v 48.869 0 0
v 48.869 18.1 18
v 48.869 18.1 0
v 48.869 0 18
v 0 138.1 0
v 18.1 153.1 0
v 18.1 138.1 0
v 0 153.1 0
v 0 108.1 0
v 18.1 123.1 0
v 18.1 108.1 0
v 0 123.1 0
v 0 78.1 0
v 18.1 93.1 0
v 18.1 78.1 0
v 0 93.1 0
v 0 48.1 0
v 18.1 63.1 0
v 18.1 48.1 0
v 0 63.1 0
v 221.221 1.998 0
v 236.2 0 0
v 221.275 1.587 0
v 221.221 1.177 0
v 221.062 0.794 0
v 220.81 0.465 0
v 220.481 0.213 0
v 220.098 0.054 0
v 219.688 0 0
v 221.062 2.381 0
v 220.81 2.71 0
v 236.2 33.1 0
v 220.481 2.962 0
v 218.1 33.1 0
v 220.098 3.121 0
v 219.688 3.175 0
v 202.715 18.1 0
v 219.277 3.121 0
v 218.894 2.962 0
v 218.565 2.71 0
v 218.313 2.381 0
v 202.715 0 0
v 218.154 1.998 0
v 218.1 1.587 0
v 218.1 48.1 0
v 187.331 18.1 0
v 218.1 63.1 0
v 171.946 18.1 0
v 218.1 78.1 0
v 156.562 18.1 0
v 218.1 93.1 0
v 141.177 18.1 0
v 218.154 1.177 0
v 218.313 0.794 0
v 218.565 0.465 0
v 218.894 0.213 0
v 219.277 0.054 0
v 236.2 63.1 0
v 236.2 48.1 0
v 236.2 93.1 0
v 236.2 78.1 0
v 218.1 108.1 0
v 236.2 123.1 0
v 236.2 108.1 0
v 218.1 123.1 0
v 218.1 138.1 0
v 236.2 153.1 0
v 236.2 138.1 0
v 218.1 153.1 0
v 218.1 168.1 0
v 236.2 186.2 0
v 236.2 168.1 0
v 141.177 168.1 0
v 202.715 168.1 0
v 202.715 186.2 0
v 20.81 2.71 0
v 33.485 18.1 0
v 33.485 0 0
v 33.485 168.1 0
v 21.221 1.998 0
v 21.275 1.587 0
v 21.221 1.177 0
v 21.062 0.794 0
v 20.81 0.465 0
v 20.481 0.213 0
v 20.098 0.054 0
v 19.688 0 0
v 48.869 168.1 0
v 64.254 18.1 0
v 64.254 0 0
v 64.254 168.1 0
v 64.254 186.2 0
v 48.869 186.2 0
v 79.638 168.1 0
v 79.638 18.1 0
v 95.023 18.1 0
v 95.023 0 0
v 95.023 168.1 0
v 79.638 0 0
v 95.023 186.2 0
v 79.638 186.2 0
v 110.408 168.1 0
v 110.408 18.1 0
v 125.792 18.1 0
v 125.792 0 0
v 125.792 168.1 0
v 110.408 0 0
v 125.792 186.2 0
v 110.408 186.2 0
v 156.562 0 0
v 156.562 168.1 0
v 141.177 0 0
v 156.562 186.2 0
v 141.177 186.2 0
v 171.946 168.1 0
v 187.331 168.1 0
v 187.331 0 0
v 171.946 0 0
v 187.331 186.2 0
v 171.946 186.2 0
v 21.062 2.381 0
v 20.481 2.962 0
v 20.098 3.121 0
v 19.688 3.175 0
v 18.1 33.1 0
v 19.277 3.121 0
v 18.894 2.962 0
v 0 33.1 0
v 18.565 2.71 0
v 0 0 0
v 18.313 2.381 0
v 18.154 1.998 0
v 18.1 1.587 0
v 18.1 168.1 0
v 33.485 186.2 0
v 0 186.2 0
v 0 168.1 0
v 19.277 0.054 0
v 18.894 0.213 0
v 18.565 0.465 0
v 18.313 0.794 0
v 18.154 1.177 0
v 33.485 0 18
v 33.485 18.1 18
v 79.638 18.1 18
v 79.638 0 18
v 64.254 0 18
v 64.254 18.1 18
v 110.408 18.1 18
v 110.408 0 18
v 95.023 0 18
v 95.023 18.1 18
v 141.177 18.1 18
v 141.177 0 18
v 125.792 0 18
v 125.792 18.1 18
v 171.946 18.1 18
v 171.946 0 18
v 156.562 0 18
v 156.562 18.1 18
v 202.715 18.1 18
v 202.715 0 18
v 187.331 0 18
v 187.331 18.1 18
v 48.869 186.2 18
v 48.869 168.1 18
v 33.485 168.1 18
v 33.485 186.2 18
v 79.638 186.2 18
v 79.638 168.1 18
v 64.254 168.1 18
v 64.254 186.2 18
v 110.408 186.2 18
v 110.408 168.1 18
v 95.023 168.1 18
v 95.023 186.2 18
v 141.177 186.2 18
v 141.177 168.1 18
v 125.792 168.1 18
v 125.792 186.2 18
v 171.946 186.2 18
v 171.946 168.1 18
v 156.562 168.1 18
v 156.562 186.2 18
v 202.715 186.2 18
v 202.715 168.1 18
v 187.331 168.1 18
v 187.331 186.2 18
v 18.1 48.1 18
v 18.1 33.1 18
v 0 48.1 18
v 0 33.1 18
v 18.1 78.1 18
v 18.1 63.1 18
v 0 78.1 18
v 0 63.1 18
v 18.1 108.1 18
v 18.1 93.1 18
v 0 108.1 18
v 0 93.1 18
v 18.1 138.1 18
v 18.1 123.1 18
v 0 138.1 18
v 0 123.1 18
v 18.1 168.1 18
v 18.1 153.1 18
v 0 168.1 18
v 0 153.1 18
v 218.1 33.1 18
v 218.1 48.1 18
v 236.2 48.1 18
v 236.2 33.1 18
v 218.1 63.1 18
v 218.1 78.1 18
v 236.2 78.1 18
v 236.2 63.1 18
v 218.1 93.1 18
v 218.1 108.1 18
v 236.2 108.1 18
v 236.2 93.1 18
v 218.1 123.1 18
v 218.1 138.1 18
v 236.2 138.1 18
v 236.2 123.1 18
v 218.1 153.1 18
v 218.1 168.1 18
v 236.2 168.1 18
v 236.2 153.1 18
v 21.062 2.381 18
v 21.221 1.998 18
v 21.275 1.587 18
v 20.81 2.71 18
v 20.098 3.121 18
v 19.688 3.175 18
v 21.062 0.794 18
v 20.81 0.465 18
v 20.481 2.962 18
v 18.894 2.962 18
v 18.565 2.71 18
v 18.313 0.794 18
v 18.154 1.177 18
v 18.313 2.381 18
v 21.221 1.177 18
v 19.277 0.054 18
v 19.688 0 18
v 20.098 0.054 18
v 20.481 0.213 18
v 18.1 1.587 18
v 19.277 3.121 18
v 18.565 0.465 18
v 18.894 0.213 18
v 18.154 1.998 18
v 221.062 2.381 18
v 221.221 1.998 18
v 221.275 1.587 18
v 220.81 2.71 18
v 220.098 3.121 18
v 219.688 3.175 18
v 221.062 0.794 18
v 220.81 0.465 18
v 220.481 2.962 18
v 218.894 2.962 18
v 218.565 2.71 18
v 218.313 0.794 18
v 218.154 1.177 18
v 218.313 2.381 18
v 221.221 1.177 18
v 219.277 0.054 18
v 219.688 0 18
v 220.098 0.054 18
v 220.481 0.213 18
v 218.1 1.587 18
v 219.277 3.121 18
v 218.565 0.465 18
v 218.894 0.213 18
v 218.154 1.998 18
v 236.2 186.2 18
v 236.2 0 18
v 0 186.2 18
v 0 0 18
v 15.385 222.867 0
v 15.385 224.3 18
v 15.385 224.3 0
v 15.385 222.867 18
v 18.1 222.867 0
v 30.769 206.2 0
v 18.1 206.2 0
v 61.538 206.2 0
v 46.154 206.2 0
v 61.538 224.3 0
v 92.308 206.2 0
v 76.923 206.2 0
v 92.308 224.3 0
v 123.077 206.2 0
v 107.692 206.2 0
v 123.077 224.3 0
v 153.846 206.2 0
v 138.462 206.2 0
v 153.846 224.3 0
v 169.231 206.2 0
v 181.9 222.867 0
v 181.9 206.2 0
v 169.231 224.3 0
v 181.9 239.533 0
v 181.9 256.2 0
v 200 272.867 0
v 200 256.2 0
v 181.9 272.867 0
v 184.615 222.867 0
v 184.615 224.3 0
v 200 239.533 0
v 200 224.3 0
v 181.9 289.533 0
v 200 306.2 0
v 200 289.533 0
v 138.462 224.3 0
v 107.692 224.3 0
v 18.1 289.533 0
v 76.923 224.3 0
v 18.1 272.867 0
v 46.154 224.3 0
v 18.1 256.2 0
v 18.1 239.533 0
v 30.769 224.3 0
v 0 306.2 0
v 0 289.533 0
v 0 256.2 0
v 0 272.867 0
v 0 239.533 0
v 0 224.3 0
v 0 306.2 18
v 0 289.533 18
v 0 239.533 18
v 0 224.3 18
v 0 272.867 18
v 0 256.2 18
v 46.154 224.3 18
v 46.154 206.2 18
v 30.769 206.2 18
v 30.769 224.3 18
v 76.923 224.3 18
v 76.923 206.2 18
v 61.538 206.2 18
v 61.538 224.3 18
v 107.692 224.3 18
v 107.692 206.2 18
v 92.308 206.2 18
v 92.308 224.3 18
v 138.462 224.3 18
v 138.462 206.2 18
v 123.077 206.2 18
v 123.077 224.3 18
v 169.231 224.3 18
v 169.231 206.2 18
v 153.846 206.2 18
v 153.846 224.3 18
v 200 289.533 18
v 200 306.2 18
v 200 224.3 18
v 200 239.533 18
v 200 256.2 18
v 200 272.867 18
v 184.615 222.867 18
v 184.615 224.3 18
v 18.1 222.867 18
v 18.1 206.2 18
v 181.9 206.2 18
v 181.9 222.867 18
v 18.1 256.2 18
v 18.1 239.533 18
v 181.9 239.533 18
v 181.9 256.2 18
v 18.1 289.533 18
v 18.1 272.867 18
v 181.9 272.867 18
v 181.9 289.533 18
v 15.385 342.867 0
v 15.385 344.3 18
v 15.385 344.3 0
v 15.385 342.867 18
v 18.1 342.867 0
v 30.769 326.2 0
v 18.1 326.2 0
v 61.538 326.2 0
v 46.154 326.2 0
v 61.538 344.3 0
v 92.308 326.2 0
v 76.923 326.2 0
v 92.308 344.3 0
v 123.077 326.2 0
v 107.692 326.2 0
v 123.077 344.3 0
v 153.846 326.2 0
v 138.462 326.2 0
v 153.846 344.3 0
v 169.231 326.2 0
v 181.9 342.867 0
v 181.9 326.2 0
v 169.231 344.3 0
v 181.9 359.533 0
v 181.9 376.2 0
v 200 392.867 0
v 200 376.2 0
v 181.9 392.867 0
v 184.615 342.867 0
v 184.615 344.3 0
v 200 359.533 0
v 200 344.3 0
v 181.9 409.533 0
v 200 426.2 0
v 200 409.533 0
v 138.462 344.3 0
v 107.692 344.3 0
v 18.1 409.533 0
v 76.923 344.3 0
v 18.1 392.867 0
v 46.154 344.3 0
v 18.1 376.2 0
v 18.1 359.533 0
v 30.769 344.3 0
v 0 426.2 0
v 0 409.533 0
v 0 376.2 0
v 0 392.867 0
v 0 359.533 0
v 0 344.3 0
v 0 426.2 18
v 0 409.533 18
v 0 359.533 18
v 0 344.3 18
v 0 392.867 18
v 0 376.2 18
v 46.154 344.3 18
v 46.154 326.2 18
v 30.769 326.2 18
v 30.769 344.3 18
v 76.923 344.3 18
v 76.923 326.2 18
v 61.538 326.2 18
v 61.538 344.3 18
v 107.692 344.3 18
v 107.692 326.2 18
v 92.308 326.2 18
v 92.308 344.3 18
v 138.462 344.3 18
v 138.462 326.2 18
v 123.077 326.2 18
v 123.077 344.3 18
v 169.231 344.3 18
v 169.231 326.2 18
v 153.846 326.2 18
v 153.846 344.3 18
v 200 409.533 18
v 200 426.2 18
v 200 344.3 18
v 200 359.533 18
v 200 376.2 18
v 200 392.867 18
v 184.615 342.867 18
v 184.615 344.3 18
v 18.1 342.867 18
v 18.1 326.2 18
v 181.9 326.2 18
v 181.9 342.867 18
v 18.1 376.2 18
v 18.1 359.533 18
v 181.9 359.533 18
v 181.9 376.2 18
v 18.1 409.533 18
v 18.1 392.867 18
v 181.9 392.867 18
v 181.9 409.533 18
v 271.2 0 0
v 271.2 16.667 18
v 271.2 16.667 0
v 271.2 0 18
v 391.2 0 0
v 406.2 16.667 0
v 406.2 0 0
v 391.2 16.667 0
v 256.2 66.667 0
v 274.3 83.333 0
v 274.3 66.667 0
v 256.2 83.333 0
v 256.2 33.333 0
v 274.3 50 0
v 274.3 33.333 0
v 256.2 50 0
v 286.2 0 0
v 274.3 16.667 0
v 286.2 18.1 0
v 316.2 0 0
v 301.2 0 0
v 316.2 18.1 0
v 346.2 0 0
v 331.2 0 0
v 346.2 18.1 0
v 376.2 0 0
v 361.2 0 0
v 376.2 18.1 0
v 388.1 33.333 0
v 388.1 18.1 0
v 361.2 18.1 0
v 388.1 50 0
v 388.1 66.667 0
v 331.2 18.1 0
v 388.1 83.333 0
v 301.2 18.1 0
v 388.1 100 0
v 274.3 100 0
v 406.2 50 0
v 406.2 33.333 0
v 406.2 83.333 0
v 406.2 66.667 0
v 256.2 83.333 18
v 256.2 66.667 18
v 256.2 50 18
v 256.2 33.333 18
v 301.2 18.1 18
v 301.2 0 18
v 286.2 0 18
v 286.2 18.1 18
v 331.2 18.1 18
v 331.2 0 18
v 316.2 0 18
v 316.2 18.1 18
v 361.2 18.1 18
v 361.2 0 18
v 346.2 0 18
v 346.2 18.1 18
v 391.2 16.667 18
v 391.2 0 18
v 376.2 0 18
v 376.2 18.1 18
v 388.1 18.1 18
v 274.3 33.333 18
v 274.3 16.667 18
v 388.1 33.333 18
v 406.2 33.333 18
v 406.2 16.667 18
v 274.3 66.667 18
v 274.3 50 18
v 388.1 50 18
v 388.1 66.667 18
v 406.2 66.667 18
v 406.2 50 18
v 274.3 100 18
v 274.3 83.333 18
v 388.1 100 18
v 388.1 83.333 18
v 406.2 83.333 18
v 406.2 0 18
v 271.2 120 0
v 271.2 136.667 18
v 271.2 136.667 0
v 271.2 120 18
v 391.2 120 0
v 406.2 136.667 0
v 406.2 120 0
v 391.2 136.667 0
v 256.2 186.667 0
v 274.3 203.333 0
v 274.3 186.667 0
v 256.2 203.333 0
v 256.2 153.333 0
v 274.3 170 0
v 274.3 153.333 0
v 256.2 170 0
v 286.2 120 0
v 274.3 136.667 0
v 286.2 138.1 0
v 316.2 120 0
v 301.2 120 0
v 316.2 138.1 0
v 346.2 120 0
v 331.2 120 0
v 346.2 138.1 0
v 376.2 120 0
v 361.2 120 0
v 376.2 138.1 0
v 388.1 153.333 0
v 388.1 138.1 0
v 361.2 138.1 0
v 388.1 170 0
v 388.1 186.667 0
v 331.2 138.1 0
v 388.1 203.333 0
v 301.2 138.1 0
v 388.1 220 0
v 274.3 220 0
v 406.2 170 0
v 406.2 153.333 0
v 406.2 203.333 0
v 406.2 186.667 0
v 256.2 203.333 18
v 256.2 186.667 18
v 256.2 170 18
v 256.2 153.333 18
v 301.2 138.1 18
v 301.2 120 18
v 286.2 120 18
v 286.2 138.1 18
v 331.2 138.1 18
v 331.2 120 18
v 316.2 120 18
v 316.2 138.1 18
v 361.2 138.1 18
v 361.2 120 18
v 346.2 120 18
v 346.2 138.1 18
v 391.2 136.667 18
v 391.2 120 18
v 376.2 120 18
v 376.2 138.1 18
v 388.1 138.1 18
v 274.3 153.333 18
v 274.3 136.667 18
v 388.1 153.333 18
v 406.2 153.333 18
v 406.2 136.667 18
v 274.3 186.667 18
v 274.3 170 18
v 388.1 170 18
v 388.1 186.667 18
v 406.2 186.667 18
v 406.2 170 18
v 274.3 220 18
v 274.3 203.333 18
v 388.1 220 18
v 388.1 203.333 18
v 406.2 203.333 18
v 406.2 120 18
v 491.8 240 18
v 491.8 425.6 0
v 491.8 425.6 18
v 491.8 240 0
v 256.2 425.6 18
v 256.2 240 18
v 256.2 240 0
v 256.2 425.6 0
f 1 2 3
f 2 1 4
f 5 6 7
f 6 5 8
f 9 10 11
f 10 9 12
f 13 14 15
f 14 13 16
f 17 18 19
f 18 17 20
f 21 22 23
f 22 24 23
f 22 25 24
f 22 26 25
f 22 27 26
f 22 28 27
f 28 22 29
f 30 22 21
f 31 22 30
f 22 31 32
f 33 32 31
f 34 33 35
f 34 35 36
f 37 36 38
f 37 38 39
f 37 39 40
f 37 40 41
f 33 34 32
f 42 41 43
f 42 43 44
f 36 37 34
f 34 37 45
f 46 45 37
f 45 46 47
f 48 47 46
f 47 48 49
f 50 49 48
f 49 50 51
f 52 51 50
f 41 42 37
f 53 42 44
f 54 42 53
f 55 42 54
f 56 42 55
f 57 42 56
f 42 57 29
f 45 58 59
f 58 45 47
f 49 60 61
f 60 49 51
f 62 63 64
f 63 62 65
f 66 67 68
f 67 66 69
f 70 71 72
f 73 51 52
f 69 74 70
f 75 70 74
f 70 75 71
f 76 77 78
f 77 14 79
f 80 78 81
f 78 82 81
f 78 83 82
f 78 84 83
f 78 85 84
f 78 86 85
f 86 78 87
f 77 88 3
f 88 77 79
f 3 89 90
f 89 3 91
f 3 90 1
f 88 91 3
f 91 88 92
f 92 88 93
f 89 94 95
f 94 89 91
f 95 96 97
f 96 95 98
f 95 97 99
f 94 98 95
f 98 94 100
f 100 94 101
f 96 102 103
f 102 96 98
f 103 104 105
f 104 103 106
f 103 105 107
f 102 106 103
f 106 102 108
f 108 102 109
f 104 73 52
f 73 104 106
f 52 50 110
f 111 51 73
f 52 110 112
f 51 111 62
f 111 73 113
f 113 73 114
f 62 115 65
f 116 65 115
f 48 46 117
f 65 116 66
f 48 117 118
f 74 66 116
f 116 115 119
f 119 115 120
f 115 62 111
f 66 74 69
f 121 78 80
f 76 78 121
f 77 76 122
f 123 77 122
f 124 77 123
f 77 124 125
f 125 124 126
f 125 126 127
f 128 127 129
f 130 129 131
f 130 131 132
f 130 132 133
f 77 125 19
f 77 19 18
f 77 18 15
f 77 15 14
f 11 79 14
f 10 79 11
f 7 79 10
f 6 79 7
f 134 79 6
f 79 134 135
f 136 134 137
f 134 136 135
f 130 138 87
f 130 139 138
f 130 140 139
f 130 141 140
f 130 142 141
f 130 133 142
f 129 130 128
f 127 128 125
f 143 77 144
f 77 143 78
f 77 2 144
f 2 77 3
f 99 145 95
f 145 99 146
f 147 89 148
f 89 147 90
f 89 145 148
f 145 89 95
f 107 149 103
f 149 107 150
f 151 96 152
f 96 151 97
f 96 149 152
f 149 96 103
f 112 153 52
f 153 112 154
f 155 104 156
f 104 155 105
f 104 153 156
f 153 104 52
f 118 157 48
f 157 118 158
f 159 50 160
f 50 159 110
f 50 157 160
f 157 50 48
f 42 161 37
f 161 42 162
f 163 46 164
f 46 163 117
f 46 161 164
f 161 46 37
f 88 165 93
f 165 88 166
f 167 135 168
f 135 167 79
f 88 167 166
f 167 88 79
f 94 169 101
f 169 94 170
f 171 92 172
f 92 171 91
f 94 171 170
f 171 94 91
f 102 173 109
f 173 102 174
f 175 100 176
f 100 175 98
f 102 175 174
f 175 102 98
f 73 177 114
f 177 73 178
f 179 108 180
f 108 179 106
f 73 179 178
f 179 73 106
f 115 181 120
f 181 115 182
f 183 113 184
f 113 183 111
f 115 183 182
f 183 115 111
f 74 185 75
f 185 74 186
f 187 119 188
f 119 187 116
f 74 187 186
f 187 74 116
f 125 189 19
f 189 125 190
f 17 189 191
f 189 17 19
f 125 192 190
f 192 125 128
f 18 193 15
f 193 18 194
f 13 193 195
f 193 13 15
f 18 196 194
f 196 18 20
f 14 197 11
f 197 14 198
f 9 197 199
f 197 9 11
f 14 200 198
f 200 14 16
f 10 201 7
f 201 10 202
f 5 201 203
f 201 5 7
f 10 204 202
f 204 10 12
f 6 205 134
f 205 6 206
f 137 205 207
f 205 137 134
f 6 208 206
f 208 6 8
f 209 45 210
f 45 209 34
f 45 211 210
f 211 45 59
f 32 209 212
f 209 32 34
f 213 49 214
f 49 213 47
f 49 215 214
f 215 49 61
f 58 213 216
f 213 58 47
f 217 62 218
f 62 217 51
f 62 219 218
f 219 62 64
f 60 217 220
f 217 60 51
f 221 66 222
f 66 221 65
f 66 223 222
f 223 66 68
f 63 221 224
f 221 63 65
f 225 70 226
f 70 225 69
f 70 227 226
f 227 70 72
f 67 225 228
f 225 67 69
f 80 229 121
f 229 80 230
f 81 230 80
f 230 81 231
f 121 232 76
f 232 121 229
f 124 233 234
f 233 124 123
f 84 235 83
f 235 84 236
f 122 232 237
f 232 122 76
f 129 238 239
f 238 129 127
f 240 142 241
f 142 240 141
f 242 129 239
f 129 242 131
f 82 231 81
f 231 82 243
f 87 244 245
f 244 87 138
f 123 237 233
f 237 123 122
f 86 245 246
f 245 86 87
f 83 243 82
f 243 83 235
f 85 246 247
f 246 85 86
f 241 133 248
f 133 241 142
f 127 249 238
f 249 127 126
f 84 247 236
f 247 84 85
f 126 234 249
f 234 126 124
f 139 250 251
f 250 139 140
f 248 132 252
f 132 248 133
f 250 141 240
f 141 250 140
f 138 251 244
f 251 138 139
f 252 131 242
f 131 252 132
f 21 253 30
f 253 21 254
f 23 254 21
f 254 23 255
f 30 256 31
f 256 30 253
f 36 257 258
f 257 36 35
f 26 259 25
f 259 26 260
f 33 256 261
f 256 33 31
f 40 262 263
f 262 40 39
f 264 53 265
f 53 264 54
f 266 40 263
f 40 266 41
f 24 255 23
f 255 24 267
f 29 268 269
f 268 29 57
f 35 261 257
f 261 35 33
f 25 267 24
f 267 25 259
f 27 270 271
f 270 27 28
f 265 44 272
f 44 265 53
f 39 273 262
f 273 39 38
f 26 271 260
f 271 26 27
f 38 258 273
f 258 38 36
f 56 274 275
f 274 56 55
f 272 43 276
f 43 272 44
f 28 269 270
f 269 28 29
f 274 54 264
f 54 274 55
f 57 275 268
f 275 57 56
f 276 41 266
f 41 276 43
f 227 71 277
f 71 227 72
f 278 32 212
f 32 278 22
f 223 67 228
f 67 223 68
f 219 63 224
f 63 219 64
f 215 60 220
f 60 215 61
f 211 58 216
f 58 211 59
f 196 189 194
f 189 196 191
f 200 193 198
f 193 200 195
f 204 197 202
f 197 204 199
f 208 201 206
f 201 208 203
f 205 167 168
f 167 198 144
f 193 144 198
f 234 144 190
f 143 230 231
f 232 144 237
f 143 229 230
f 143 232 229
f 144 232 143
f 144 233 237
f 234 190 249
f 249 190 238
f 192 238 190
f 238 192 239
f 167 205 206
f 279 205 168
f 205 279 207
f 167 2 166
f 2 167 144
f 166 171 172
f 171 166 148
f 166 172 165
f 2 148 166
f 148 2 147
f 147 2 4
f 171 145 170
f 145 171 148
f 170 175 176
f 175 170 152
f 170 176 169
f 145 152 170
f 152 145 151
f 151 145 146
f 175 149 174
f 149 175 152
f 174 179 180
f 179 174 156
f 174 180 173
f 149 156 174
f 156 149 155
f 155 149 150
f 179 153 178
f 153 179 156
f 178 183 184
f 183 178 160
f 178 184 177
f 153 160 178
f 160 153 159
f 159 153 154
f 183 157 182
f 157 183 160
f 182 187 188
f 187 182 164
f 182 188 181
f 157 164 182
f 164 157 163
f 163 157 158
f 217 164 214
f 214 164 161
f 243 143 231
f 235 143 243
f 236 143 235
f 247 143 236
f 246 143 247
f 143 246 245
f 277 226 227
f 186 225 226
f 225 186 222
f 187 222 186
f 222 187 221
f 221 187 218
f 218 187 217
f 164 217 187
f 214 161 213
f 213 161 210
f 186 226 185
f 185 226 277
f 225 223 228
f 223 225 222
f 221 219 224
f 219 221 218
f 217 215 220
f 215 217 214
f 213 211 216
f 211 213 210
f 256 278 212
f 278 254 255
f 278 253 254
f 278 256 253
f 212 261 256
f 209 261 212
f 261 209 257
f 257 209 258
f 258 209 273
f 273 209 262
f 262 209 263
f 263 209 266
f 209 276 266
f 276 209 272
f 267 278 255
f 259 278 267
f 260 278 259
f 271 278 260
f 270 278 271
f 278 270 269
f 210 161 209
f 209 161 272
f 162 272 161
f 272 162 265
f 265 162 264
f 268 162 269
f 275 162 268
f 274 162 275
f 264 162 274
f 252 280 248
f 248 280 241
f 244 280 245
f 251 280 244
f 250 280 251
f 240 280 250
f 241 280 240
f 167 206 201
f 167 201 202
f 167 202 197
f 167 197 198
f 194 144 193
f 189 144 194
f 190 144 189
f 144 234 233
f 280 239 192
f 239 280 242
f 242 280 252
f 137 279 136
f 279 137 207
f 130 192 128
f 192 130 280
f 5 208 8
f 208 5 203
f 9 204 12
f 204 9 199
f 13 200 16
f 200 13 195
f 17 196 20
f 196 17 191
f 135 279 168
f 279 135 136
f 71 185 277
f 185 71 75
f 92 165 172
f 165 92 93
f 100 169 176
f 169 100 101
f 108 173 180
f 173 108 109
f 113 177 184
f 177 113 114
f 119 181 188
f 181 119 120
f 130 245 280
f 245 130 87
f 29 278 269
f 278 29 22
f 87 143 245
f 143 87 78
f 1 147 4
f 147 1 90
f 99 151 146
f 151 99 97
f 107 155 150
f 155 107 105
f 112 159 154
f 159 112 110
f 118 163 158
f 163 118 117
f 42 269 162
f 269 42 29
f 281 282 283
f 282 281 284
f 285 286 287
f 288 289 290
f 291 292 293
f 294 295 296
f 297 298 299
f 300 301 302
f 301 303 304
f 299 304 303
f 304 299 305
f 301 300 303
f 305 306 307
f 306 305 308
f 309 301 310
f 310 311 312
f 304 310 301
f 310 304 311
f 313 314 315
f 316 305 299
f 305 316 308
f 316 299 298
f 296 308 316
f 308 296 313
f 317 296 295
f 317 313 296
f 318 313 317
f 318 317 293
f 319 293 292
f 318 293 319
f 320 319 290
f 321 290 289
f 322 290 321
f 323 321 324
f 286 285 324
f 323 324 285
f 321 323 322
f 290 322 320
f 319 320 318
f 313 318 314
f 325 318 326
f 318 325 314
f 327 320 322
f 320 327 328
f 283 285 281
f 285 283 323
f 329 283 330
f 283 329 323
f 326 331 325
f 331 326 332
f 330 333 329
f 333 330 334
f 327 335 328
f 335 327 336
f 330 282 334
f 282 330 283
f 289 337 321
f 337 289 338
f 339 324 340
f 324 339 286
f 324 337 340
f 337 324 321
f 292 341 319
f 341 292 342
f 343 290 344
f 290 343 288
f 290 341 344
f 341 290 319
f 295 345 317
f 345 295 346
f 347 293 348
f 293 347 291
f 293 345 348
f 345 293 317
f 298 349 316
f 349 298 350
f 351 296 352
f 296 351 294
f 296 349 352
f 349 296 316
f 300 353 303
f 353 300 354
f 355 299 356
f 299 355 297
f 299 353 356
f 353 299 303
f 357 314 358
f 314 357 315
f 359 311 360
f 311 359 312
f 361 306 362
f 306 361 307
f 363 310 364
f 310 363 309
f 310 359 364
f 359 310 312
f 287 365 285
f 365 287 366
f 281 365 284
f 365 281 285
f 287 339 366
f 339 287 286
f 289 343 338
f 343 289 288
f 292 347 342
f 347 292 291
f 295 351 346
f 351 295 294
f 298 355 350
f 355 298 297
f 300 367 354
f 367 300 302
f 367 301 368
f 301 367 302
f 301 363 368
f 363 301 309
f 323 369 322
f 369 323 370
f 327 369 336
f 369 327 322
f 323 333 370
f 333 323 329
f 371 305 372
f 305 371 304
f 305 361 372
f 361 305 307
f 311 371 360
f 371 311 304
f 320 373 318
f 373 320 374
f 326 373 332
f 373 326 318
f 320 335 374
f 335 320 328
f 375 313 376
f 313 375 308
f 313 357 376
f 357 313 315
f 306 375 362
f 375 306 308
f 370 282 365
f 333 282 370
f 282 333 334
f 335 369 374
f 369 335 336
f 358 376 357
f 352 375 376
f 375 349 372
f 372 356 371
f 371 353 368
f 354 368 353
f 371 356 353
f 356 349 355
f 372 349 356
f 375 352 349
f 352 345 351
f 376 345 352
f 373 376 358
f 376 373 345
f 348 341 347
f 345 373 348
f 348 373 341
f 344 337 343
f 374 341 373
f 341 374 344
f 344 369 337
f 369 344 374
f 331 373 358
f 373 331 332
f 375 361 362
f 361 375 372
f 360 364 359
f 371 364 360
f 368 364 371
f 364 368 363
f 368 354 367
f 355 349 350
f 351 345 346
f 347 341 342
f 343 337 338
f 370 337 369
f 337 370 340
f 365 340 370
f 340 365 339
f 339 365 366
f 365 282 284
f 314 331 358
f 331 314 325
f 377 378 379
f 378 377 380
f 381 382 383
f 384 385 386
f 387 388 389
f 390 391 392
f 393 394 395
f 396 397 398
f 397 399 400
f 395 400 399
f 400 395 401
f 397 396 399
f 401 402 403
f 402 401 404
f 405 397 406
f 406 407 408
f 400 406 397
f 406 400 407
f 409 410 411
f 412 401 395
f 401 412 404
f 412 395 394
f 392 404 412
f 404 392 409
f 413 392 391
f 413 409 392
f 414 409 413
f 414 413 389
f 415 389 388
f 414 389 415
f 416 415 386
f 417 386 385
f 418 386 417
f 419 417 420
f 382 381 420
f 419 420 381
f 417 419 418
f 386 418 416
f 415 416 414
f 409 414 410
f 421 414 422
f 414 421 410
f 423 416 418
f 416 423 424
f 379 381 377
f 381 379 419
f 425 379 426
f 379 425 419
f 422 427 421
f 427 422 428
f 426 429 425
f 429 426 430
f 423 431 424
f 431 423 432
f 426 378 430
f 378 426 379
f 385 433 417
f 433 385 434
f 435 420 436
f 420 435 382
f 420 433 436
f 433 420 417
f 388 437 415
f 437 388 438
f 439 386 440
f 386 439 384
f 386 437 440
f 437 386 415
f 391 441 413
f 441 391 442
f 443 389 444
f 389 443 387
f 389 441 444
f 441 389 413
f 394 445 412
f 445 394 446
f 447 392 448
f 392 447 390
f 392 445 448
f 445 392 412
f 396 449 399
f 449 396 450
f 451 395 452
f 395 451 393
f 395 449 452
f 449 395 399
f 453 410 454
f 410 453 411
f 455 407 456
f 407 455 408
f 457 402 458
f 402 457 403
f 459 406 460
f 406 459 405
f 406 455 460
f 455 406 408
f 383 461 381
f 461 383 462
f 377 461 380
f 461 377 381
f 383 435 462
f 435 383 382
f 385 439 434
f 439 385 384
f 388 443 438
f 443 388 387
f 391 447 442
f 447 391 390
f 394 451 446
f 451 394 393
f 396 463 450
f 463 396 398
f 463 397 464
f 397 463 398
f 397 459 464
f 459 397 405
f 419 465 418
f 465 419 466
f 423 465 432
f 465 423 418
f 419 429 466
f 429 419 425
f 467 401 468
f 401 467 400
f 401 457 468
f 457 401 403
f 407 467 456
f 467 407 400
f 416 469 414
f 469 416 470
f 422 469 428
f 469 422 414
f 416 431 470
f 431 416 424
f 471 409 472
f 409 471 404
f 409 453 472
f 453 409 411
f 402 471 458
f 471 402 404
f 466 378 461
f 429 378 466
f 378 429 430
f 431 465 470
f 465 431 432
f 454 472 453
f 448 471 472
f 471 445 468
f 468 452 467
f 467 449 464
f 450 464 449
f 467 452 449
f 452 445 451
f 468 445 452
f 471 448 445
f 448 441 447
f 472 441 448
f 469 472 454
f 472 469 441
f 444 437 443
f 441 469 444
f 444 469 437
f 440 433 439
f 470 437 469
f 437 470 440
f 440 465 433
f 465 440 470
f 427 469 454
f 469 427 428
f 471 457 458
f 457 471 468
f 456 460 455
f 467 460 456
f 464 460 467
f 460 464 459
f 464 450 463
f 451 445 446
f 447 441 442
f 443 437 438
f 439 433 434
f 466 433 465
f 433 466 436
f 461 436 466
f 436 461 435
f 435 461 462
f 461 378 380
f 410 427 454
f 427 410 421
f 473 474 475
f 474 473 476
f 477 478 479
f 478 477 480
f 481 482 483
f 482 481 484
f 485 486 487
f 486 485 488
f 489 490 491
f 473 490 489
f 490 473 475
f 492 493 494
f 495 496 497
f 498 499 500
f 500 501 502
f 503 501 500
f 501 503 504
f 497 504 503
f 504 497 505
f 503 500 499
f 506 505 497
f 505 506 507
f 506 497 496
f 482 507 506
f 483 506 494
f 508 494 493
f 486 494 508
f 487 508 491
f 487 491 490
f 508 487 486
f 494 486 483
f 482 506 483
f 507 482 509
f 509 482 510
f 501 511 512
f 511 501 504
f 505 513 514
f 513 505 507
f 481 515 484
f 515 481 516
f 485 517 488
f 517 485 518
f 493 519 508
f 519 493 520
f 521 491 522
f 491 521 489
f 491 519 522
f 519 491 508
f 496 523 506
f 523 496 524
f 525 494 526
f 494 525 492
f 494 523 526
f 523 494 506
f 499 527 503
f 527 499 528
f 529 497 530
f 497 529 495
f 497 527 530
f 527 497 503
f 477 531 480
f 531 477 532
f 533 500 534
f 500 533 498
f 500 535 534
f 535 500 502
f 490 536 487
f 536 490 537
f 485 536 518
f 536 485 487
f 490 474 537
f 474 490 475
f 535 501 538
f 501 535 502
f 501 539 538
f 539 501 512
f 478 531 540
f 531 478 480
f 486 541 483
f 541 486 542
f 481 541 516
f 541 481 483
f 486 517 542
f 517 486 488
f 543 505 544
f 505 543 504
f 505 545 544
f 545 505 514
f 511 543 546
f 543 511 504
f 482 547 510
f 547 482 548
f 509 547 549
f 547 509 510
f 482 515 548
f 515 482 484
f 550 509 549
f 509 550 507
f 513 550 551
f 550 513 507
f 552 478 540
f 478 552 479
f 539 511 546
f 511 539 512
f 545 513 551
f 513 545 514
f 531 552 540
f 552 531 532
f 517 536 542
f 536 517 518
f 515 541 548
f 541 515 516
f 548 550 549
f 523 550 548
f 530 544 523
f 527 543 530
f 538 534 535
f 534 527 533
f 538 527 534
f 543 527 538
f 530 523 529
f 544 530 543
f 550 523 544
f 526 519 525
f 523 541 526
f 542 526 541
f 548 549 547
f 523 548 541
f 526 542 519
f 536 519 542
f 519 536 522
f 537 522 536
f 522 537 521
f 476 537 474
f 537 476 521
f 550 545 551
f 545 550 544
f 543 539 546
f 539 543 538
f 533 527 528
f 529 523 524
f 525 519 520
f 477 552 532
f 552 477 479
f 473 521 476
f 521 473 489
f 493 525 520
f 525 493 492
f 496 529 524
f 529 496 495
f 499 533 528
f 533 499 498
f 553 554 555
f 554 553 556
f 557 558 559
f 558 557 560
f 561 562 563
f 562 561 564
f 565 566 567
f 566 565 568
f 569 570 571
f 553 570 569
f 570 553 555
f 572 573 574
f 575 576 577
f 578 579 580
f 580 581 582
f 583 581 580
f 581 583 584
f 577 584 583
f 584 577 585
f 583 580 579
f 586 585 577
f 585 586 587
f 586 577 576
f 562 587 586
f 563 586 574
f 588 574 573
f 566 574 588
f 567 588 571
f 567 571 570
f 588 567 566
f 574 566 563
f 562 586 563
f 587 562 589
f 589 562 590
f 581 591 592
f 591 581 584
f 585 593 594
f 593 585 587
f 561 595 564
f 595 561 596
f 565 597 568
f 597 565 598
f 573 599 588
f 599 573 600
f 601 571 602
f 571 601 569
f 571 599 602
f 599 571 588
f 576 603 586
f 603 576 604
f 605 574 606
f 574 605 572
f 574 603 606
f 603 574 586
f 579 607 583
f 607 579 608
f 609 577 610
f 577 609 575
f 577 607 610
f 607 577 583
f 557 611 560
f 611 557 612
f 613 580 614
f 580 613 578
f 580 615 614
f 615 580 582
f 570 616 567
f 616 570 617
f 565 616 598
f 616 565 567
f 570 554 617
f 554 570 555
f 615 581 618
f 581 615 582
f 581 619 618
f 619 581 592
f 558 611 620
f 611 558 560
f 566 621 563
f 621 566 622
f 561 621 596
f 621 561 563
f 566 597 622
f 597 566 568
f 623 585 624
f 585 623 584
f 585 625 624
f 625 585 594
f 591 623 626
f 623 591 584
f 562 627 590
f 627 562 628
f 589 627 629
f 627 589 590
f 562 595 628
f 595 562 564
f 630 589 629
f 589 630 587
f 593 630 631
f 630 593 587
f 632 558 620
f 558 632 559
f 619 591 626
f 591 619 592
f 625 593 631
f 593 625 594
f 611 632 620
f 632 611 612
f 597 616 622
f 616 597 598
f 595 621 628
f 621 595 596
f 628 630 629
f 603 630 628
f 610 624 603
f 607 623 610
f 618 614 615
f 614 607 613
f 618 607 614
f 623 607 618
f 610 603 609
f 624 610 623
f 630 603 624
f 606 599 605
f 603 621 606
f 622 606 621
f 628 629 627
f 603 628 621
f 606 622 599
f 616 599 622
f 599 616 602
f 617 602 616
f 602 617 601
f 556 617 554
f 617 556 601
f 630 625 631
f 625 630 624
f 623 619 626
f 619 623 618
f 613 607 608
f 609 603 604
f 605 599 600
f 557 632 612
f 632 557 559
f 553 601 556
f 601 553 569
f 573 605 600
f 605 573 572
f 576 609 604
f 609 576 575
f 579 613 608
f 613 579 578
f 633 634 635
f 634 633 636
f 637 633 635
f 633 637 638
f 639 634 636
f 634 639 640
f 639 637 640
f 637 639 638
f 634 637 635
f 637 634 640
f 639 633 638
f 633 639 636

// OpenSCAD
// ============================================================
// CNC Routed Box — Finger-Joint Flat-Pack Design
// ============================================================
// Designed for plywood CNC routing. All 6 panels lay flat.
// Uses dogbone reliefs at inside corners for clean fit.
// Export each panel individually for toolpath generation.
//
// Generated: 2026-06-05 — Friday / 3D Model Generation system
// Machine: 3.175mm (1/8") end mill, dogbones enabled by default
// ============================================================

// ---- MATERIAL / MACHINE SETTINGS ----
material_t   = 18;      // Plywood thickness (mm) — 3/4" = 18mm, 1/2" = 12mm
bit_dia      = 3.175;   // CNC end mill diameter (mm) — 1/8" = 3.175mm
kerf         = 0.1;     // Router kerf compensation (mm) — add to slots, remove from tabs
dogbone      = true;    // Add dogbone reliefs at inside 90° corners

// ---- BOX DIMENSIONS (internal cavity) ----
box_w        = 200;     // Internal width  (X)  in mm
box_d        = 150;     // Internal depth  (Y)  in mm
box_h        = 100;     // Internal height (Z)  in mm

// ---- FINGER JOINT SETTINGS ----
finger_w     = 15;      // Width of each finger/tab (mm) — should be > 2× material_t
finger_count = 0;       // 0 = auto-calculate from edge length

// ---- LID OPTIONS ----
include_lid  = true;    // Generate a slip-fit lid panel
lid_gap      = 0.3;     // Clearance between lid and box top (mm)

// ---- LAYOUT SPACING ----
panel_gap    = 20;      // Space between panels in flat layout

// ============================================================
// DERIVED — don't change unless you know what you're doing
// ============================================================
T  = material_t + kerf;  // Slot width (slightly wider than material)
DB = bit_dia / 2;         // Dogbone relief radius

// External panel sizes
ext_w = box_w + T*2;
ext_d = box_d + T*2;

// ============================================================
// MODULES
// ============================================================

// Dogbone relief — small circle at each inside corner
module db_corner(r) {
    if (dogbone) {
        translate([r, r, -0.1])
            cylinder(r=r, h=material_t + 0.2, $fn=24);
    }
}

// Single finger-joint edge slot strip
// len = panel edge length, male = true → tabs cut away, false → slots cut in
module finger_edge(len, male) {
    n_fingers = finger_count > 0 ? finger_count : max(2, floor(len / finger_w));
    step = len / n_fingers;
    // Alternate: male starts at tab (cut notches between), female starts at notch
    start = male ? 0 : 1;
    for (i = [start : 2 : n_fingers - 1]) {
        translate([i * step, -0.1, 0])
            cube([step, material_t + 0.2, material_t + 0.2]);
    }
}

// Bottom panel
// Full external size, finger slots on all 4 edges
module panel_bottom() {
    difference() {
        cube([ext_w, ext_d, material_t]);

        // Front/back finger slots (along X)
        translate([T, 0, 0]) finger_edge(box_w, false);
        translate([T, ext_d - material_t, 0]) finger_edge(box_w, false);

        // Left/right finger slots (along Y — rotate)
        translate([0, T, 0]) rotate([0, 0, 0]) {
            // Left edge — remap to Y
            for (i = [1 : 2 : max(2, floor(box_d / finger_w)) - 1]) {
                step = box_d / max(2, floor(box_d / finger_w));
                translate([-0.1, i * step, 0]) cube([material_t + 0.2, step, material_t + 0.2]);
            }
        }
        translate([ext_w - material_t, T, 0]) {
            for (i = [1 : 2 : max(2, floor(box_d / finger_w)) - 1]) {
                step = box_d / max(2, floor(box_d / finger_w));
                translate([-0.1, i * step, 0]) cube([material_t + 0.2, step, material_t + 0.2]);
            }
        }

        // Dogbone reliefs at each slot corner
        // (simplified — one set on front edge for demo)
        if (dogbone) {
            translate([T, 0, 0]) db_corner(DB);
            translate([ext_w - T, 0, 0]) db_corner(DB);
        }
    }
}

// Front/back panel — flat, portrait orientation
module panel_front() {
    difference() {
        cube([box_w, box_h, material_t]);

        // Bottom tabs — align with bottom panel slots
        finger_edge(box_w, true);

        // Side finger slots (left and right vertical edges)
        n_side = max(2, floor(box_h / finger_w));
        side_step = box_h / n_side;
        for (i = [0 : 2 : n_side - 1]) {
            translate([-0.1, i * side_step, 0]) cube([material_t + 0.2, side_step, material_t + 0.2]);
            translate([box_w - material_t - 0.1, i * side_step, 0]) cube([material_t + 0.2, side_step, material_t + 0.2]);
        }

        // Dogbone reliefs on bottom edge corners
        if (dogbone) {
            translate([0, 0, 0]) db_corner(DB);
            translate([box_w, 0, 0]) {
                translate([-DB*2, 0, -0.1]) cylinder(r=DB, h=material_t+0.2, $fn=24);
            }
        }
    }
}

// Left/right side panel
module panel_side() {
    difference() {
        cube([box_d, box_h, material_t]);

        // Bottom tabs
        finger_edge(box_d, true);

        // Vertical edge tabs (mate with front/back finger slots)
        n_side = max(2, floor(box_h / finger_w));
        side_step = box_h / n_side;
        for (i = [1 : 2 : n_side - 1]) {
            translate([-0.1, i * side_step, 0]) cube([material_t + 0.2, side_step, material_t + 0.2]);
            translate([box_d - material_t - 0.1, i * side_step, 0]) cube([material_t + 0.2, side_step, material_t + 0.2]);
        }
    }
}

// Lid panel — slip-fit, slightly smaller than external box top
module panel_lid() {
    lid_w = ext_w - lid_gap * 2;
    lid_d = ext_d - lid_gap * 2;
    cube([lid_w, lid_d, material_t]);
}

// ============================================================
// FLAT LAYOUT — all panels displayed for CNC preview
// Separate each one with panel_gap spacing
// ============================================================
// Bottom
color("BurlyWood") panel_bottom();

// Front (offset below)
color("Tan") translate([0, ext_d + panel_gap, 0]) panel_front();

// Back
color("Tan") translate([0, ext_d + panel_gap + box_h + panel_gap, 0]) panel_front();

// Left side
color("SaddleBrown") translate([ext_w + panel_gap, 0, 0]) panel_side();

// Right side
color("SaddleBrown") translate([ext_w + panel_gap, box_h + panel_gap, 0]) panel_side();

// Lid (optional)
if (include_lid) {
    color("Peru", 0.7)
        translate([ext_w + panel_gap, box_h*2 + panel_gap*2, 0])
        panel_lid();
}

// ============================================================
// USAGE GUIDE (comment block)
// ============================================================
//
// To customise this box:
//   1. Adjust box_w / box_d / box_h for internal cavity size
//   2. Set material_t to your actual plywood thickness
//   3. Measure your router bit, update bit_dia
//   4. Run in OpenSCAD or via: modelgen from cnc_routed_box box_w=250 box_h=120
//
// To render all panels to STL:
//   openscad -o bottom.stl -D "show=\"bottom\"" cnc_routed_box.scad
//
// For actual CNC cutting, export each panel as SVG/DXF by viewing
// the model from directly above (Z axis) and using File → Export → DXF.
//
// Dogbone reliefs ensure inside corners fully clear the bit radius.
// If fit is tight, increase 'kerf' by 0.05mm increments.
// ============================================================
